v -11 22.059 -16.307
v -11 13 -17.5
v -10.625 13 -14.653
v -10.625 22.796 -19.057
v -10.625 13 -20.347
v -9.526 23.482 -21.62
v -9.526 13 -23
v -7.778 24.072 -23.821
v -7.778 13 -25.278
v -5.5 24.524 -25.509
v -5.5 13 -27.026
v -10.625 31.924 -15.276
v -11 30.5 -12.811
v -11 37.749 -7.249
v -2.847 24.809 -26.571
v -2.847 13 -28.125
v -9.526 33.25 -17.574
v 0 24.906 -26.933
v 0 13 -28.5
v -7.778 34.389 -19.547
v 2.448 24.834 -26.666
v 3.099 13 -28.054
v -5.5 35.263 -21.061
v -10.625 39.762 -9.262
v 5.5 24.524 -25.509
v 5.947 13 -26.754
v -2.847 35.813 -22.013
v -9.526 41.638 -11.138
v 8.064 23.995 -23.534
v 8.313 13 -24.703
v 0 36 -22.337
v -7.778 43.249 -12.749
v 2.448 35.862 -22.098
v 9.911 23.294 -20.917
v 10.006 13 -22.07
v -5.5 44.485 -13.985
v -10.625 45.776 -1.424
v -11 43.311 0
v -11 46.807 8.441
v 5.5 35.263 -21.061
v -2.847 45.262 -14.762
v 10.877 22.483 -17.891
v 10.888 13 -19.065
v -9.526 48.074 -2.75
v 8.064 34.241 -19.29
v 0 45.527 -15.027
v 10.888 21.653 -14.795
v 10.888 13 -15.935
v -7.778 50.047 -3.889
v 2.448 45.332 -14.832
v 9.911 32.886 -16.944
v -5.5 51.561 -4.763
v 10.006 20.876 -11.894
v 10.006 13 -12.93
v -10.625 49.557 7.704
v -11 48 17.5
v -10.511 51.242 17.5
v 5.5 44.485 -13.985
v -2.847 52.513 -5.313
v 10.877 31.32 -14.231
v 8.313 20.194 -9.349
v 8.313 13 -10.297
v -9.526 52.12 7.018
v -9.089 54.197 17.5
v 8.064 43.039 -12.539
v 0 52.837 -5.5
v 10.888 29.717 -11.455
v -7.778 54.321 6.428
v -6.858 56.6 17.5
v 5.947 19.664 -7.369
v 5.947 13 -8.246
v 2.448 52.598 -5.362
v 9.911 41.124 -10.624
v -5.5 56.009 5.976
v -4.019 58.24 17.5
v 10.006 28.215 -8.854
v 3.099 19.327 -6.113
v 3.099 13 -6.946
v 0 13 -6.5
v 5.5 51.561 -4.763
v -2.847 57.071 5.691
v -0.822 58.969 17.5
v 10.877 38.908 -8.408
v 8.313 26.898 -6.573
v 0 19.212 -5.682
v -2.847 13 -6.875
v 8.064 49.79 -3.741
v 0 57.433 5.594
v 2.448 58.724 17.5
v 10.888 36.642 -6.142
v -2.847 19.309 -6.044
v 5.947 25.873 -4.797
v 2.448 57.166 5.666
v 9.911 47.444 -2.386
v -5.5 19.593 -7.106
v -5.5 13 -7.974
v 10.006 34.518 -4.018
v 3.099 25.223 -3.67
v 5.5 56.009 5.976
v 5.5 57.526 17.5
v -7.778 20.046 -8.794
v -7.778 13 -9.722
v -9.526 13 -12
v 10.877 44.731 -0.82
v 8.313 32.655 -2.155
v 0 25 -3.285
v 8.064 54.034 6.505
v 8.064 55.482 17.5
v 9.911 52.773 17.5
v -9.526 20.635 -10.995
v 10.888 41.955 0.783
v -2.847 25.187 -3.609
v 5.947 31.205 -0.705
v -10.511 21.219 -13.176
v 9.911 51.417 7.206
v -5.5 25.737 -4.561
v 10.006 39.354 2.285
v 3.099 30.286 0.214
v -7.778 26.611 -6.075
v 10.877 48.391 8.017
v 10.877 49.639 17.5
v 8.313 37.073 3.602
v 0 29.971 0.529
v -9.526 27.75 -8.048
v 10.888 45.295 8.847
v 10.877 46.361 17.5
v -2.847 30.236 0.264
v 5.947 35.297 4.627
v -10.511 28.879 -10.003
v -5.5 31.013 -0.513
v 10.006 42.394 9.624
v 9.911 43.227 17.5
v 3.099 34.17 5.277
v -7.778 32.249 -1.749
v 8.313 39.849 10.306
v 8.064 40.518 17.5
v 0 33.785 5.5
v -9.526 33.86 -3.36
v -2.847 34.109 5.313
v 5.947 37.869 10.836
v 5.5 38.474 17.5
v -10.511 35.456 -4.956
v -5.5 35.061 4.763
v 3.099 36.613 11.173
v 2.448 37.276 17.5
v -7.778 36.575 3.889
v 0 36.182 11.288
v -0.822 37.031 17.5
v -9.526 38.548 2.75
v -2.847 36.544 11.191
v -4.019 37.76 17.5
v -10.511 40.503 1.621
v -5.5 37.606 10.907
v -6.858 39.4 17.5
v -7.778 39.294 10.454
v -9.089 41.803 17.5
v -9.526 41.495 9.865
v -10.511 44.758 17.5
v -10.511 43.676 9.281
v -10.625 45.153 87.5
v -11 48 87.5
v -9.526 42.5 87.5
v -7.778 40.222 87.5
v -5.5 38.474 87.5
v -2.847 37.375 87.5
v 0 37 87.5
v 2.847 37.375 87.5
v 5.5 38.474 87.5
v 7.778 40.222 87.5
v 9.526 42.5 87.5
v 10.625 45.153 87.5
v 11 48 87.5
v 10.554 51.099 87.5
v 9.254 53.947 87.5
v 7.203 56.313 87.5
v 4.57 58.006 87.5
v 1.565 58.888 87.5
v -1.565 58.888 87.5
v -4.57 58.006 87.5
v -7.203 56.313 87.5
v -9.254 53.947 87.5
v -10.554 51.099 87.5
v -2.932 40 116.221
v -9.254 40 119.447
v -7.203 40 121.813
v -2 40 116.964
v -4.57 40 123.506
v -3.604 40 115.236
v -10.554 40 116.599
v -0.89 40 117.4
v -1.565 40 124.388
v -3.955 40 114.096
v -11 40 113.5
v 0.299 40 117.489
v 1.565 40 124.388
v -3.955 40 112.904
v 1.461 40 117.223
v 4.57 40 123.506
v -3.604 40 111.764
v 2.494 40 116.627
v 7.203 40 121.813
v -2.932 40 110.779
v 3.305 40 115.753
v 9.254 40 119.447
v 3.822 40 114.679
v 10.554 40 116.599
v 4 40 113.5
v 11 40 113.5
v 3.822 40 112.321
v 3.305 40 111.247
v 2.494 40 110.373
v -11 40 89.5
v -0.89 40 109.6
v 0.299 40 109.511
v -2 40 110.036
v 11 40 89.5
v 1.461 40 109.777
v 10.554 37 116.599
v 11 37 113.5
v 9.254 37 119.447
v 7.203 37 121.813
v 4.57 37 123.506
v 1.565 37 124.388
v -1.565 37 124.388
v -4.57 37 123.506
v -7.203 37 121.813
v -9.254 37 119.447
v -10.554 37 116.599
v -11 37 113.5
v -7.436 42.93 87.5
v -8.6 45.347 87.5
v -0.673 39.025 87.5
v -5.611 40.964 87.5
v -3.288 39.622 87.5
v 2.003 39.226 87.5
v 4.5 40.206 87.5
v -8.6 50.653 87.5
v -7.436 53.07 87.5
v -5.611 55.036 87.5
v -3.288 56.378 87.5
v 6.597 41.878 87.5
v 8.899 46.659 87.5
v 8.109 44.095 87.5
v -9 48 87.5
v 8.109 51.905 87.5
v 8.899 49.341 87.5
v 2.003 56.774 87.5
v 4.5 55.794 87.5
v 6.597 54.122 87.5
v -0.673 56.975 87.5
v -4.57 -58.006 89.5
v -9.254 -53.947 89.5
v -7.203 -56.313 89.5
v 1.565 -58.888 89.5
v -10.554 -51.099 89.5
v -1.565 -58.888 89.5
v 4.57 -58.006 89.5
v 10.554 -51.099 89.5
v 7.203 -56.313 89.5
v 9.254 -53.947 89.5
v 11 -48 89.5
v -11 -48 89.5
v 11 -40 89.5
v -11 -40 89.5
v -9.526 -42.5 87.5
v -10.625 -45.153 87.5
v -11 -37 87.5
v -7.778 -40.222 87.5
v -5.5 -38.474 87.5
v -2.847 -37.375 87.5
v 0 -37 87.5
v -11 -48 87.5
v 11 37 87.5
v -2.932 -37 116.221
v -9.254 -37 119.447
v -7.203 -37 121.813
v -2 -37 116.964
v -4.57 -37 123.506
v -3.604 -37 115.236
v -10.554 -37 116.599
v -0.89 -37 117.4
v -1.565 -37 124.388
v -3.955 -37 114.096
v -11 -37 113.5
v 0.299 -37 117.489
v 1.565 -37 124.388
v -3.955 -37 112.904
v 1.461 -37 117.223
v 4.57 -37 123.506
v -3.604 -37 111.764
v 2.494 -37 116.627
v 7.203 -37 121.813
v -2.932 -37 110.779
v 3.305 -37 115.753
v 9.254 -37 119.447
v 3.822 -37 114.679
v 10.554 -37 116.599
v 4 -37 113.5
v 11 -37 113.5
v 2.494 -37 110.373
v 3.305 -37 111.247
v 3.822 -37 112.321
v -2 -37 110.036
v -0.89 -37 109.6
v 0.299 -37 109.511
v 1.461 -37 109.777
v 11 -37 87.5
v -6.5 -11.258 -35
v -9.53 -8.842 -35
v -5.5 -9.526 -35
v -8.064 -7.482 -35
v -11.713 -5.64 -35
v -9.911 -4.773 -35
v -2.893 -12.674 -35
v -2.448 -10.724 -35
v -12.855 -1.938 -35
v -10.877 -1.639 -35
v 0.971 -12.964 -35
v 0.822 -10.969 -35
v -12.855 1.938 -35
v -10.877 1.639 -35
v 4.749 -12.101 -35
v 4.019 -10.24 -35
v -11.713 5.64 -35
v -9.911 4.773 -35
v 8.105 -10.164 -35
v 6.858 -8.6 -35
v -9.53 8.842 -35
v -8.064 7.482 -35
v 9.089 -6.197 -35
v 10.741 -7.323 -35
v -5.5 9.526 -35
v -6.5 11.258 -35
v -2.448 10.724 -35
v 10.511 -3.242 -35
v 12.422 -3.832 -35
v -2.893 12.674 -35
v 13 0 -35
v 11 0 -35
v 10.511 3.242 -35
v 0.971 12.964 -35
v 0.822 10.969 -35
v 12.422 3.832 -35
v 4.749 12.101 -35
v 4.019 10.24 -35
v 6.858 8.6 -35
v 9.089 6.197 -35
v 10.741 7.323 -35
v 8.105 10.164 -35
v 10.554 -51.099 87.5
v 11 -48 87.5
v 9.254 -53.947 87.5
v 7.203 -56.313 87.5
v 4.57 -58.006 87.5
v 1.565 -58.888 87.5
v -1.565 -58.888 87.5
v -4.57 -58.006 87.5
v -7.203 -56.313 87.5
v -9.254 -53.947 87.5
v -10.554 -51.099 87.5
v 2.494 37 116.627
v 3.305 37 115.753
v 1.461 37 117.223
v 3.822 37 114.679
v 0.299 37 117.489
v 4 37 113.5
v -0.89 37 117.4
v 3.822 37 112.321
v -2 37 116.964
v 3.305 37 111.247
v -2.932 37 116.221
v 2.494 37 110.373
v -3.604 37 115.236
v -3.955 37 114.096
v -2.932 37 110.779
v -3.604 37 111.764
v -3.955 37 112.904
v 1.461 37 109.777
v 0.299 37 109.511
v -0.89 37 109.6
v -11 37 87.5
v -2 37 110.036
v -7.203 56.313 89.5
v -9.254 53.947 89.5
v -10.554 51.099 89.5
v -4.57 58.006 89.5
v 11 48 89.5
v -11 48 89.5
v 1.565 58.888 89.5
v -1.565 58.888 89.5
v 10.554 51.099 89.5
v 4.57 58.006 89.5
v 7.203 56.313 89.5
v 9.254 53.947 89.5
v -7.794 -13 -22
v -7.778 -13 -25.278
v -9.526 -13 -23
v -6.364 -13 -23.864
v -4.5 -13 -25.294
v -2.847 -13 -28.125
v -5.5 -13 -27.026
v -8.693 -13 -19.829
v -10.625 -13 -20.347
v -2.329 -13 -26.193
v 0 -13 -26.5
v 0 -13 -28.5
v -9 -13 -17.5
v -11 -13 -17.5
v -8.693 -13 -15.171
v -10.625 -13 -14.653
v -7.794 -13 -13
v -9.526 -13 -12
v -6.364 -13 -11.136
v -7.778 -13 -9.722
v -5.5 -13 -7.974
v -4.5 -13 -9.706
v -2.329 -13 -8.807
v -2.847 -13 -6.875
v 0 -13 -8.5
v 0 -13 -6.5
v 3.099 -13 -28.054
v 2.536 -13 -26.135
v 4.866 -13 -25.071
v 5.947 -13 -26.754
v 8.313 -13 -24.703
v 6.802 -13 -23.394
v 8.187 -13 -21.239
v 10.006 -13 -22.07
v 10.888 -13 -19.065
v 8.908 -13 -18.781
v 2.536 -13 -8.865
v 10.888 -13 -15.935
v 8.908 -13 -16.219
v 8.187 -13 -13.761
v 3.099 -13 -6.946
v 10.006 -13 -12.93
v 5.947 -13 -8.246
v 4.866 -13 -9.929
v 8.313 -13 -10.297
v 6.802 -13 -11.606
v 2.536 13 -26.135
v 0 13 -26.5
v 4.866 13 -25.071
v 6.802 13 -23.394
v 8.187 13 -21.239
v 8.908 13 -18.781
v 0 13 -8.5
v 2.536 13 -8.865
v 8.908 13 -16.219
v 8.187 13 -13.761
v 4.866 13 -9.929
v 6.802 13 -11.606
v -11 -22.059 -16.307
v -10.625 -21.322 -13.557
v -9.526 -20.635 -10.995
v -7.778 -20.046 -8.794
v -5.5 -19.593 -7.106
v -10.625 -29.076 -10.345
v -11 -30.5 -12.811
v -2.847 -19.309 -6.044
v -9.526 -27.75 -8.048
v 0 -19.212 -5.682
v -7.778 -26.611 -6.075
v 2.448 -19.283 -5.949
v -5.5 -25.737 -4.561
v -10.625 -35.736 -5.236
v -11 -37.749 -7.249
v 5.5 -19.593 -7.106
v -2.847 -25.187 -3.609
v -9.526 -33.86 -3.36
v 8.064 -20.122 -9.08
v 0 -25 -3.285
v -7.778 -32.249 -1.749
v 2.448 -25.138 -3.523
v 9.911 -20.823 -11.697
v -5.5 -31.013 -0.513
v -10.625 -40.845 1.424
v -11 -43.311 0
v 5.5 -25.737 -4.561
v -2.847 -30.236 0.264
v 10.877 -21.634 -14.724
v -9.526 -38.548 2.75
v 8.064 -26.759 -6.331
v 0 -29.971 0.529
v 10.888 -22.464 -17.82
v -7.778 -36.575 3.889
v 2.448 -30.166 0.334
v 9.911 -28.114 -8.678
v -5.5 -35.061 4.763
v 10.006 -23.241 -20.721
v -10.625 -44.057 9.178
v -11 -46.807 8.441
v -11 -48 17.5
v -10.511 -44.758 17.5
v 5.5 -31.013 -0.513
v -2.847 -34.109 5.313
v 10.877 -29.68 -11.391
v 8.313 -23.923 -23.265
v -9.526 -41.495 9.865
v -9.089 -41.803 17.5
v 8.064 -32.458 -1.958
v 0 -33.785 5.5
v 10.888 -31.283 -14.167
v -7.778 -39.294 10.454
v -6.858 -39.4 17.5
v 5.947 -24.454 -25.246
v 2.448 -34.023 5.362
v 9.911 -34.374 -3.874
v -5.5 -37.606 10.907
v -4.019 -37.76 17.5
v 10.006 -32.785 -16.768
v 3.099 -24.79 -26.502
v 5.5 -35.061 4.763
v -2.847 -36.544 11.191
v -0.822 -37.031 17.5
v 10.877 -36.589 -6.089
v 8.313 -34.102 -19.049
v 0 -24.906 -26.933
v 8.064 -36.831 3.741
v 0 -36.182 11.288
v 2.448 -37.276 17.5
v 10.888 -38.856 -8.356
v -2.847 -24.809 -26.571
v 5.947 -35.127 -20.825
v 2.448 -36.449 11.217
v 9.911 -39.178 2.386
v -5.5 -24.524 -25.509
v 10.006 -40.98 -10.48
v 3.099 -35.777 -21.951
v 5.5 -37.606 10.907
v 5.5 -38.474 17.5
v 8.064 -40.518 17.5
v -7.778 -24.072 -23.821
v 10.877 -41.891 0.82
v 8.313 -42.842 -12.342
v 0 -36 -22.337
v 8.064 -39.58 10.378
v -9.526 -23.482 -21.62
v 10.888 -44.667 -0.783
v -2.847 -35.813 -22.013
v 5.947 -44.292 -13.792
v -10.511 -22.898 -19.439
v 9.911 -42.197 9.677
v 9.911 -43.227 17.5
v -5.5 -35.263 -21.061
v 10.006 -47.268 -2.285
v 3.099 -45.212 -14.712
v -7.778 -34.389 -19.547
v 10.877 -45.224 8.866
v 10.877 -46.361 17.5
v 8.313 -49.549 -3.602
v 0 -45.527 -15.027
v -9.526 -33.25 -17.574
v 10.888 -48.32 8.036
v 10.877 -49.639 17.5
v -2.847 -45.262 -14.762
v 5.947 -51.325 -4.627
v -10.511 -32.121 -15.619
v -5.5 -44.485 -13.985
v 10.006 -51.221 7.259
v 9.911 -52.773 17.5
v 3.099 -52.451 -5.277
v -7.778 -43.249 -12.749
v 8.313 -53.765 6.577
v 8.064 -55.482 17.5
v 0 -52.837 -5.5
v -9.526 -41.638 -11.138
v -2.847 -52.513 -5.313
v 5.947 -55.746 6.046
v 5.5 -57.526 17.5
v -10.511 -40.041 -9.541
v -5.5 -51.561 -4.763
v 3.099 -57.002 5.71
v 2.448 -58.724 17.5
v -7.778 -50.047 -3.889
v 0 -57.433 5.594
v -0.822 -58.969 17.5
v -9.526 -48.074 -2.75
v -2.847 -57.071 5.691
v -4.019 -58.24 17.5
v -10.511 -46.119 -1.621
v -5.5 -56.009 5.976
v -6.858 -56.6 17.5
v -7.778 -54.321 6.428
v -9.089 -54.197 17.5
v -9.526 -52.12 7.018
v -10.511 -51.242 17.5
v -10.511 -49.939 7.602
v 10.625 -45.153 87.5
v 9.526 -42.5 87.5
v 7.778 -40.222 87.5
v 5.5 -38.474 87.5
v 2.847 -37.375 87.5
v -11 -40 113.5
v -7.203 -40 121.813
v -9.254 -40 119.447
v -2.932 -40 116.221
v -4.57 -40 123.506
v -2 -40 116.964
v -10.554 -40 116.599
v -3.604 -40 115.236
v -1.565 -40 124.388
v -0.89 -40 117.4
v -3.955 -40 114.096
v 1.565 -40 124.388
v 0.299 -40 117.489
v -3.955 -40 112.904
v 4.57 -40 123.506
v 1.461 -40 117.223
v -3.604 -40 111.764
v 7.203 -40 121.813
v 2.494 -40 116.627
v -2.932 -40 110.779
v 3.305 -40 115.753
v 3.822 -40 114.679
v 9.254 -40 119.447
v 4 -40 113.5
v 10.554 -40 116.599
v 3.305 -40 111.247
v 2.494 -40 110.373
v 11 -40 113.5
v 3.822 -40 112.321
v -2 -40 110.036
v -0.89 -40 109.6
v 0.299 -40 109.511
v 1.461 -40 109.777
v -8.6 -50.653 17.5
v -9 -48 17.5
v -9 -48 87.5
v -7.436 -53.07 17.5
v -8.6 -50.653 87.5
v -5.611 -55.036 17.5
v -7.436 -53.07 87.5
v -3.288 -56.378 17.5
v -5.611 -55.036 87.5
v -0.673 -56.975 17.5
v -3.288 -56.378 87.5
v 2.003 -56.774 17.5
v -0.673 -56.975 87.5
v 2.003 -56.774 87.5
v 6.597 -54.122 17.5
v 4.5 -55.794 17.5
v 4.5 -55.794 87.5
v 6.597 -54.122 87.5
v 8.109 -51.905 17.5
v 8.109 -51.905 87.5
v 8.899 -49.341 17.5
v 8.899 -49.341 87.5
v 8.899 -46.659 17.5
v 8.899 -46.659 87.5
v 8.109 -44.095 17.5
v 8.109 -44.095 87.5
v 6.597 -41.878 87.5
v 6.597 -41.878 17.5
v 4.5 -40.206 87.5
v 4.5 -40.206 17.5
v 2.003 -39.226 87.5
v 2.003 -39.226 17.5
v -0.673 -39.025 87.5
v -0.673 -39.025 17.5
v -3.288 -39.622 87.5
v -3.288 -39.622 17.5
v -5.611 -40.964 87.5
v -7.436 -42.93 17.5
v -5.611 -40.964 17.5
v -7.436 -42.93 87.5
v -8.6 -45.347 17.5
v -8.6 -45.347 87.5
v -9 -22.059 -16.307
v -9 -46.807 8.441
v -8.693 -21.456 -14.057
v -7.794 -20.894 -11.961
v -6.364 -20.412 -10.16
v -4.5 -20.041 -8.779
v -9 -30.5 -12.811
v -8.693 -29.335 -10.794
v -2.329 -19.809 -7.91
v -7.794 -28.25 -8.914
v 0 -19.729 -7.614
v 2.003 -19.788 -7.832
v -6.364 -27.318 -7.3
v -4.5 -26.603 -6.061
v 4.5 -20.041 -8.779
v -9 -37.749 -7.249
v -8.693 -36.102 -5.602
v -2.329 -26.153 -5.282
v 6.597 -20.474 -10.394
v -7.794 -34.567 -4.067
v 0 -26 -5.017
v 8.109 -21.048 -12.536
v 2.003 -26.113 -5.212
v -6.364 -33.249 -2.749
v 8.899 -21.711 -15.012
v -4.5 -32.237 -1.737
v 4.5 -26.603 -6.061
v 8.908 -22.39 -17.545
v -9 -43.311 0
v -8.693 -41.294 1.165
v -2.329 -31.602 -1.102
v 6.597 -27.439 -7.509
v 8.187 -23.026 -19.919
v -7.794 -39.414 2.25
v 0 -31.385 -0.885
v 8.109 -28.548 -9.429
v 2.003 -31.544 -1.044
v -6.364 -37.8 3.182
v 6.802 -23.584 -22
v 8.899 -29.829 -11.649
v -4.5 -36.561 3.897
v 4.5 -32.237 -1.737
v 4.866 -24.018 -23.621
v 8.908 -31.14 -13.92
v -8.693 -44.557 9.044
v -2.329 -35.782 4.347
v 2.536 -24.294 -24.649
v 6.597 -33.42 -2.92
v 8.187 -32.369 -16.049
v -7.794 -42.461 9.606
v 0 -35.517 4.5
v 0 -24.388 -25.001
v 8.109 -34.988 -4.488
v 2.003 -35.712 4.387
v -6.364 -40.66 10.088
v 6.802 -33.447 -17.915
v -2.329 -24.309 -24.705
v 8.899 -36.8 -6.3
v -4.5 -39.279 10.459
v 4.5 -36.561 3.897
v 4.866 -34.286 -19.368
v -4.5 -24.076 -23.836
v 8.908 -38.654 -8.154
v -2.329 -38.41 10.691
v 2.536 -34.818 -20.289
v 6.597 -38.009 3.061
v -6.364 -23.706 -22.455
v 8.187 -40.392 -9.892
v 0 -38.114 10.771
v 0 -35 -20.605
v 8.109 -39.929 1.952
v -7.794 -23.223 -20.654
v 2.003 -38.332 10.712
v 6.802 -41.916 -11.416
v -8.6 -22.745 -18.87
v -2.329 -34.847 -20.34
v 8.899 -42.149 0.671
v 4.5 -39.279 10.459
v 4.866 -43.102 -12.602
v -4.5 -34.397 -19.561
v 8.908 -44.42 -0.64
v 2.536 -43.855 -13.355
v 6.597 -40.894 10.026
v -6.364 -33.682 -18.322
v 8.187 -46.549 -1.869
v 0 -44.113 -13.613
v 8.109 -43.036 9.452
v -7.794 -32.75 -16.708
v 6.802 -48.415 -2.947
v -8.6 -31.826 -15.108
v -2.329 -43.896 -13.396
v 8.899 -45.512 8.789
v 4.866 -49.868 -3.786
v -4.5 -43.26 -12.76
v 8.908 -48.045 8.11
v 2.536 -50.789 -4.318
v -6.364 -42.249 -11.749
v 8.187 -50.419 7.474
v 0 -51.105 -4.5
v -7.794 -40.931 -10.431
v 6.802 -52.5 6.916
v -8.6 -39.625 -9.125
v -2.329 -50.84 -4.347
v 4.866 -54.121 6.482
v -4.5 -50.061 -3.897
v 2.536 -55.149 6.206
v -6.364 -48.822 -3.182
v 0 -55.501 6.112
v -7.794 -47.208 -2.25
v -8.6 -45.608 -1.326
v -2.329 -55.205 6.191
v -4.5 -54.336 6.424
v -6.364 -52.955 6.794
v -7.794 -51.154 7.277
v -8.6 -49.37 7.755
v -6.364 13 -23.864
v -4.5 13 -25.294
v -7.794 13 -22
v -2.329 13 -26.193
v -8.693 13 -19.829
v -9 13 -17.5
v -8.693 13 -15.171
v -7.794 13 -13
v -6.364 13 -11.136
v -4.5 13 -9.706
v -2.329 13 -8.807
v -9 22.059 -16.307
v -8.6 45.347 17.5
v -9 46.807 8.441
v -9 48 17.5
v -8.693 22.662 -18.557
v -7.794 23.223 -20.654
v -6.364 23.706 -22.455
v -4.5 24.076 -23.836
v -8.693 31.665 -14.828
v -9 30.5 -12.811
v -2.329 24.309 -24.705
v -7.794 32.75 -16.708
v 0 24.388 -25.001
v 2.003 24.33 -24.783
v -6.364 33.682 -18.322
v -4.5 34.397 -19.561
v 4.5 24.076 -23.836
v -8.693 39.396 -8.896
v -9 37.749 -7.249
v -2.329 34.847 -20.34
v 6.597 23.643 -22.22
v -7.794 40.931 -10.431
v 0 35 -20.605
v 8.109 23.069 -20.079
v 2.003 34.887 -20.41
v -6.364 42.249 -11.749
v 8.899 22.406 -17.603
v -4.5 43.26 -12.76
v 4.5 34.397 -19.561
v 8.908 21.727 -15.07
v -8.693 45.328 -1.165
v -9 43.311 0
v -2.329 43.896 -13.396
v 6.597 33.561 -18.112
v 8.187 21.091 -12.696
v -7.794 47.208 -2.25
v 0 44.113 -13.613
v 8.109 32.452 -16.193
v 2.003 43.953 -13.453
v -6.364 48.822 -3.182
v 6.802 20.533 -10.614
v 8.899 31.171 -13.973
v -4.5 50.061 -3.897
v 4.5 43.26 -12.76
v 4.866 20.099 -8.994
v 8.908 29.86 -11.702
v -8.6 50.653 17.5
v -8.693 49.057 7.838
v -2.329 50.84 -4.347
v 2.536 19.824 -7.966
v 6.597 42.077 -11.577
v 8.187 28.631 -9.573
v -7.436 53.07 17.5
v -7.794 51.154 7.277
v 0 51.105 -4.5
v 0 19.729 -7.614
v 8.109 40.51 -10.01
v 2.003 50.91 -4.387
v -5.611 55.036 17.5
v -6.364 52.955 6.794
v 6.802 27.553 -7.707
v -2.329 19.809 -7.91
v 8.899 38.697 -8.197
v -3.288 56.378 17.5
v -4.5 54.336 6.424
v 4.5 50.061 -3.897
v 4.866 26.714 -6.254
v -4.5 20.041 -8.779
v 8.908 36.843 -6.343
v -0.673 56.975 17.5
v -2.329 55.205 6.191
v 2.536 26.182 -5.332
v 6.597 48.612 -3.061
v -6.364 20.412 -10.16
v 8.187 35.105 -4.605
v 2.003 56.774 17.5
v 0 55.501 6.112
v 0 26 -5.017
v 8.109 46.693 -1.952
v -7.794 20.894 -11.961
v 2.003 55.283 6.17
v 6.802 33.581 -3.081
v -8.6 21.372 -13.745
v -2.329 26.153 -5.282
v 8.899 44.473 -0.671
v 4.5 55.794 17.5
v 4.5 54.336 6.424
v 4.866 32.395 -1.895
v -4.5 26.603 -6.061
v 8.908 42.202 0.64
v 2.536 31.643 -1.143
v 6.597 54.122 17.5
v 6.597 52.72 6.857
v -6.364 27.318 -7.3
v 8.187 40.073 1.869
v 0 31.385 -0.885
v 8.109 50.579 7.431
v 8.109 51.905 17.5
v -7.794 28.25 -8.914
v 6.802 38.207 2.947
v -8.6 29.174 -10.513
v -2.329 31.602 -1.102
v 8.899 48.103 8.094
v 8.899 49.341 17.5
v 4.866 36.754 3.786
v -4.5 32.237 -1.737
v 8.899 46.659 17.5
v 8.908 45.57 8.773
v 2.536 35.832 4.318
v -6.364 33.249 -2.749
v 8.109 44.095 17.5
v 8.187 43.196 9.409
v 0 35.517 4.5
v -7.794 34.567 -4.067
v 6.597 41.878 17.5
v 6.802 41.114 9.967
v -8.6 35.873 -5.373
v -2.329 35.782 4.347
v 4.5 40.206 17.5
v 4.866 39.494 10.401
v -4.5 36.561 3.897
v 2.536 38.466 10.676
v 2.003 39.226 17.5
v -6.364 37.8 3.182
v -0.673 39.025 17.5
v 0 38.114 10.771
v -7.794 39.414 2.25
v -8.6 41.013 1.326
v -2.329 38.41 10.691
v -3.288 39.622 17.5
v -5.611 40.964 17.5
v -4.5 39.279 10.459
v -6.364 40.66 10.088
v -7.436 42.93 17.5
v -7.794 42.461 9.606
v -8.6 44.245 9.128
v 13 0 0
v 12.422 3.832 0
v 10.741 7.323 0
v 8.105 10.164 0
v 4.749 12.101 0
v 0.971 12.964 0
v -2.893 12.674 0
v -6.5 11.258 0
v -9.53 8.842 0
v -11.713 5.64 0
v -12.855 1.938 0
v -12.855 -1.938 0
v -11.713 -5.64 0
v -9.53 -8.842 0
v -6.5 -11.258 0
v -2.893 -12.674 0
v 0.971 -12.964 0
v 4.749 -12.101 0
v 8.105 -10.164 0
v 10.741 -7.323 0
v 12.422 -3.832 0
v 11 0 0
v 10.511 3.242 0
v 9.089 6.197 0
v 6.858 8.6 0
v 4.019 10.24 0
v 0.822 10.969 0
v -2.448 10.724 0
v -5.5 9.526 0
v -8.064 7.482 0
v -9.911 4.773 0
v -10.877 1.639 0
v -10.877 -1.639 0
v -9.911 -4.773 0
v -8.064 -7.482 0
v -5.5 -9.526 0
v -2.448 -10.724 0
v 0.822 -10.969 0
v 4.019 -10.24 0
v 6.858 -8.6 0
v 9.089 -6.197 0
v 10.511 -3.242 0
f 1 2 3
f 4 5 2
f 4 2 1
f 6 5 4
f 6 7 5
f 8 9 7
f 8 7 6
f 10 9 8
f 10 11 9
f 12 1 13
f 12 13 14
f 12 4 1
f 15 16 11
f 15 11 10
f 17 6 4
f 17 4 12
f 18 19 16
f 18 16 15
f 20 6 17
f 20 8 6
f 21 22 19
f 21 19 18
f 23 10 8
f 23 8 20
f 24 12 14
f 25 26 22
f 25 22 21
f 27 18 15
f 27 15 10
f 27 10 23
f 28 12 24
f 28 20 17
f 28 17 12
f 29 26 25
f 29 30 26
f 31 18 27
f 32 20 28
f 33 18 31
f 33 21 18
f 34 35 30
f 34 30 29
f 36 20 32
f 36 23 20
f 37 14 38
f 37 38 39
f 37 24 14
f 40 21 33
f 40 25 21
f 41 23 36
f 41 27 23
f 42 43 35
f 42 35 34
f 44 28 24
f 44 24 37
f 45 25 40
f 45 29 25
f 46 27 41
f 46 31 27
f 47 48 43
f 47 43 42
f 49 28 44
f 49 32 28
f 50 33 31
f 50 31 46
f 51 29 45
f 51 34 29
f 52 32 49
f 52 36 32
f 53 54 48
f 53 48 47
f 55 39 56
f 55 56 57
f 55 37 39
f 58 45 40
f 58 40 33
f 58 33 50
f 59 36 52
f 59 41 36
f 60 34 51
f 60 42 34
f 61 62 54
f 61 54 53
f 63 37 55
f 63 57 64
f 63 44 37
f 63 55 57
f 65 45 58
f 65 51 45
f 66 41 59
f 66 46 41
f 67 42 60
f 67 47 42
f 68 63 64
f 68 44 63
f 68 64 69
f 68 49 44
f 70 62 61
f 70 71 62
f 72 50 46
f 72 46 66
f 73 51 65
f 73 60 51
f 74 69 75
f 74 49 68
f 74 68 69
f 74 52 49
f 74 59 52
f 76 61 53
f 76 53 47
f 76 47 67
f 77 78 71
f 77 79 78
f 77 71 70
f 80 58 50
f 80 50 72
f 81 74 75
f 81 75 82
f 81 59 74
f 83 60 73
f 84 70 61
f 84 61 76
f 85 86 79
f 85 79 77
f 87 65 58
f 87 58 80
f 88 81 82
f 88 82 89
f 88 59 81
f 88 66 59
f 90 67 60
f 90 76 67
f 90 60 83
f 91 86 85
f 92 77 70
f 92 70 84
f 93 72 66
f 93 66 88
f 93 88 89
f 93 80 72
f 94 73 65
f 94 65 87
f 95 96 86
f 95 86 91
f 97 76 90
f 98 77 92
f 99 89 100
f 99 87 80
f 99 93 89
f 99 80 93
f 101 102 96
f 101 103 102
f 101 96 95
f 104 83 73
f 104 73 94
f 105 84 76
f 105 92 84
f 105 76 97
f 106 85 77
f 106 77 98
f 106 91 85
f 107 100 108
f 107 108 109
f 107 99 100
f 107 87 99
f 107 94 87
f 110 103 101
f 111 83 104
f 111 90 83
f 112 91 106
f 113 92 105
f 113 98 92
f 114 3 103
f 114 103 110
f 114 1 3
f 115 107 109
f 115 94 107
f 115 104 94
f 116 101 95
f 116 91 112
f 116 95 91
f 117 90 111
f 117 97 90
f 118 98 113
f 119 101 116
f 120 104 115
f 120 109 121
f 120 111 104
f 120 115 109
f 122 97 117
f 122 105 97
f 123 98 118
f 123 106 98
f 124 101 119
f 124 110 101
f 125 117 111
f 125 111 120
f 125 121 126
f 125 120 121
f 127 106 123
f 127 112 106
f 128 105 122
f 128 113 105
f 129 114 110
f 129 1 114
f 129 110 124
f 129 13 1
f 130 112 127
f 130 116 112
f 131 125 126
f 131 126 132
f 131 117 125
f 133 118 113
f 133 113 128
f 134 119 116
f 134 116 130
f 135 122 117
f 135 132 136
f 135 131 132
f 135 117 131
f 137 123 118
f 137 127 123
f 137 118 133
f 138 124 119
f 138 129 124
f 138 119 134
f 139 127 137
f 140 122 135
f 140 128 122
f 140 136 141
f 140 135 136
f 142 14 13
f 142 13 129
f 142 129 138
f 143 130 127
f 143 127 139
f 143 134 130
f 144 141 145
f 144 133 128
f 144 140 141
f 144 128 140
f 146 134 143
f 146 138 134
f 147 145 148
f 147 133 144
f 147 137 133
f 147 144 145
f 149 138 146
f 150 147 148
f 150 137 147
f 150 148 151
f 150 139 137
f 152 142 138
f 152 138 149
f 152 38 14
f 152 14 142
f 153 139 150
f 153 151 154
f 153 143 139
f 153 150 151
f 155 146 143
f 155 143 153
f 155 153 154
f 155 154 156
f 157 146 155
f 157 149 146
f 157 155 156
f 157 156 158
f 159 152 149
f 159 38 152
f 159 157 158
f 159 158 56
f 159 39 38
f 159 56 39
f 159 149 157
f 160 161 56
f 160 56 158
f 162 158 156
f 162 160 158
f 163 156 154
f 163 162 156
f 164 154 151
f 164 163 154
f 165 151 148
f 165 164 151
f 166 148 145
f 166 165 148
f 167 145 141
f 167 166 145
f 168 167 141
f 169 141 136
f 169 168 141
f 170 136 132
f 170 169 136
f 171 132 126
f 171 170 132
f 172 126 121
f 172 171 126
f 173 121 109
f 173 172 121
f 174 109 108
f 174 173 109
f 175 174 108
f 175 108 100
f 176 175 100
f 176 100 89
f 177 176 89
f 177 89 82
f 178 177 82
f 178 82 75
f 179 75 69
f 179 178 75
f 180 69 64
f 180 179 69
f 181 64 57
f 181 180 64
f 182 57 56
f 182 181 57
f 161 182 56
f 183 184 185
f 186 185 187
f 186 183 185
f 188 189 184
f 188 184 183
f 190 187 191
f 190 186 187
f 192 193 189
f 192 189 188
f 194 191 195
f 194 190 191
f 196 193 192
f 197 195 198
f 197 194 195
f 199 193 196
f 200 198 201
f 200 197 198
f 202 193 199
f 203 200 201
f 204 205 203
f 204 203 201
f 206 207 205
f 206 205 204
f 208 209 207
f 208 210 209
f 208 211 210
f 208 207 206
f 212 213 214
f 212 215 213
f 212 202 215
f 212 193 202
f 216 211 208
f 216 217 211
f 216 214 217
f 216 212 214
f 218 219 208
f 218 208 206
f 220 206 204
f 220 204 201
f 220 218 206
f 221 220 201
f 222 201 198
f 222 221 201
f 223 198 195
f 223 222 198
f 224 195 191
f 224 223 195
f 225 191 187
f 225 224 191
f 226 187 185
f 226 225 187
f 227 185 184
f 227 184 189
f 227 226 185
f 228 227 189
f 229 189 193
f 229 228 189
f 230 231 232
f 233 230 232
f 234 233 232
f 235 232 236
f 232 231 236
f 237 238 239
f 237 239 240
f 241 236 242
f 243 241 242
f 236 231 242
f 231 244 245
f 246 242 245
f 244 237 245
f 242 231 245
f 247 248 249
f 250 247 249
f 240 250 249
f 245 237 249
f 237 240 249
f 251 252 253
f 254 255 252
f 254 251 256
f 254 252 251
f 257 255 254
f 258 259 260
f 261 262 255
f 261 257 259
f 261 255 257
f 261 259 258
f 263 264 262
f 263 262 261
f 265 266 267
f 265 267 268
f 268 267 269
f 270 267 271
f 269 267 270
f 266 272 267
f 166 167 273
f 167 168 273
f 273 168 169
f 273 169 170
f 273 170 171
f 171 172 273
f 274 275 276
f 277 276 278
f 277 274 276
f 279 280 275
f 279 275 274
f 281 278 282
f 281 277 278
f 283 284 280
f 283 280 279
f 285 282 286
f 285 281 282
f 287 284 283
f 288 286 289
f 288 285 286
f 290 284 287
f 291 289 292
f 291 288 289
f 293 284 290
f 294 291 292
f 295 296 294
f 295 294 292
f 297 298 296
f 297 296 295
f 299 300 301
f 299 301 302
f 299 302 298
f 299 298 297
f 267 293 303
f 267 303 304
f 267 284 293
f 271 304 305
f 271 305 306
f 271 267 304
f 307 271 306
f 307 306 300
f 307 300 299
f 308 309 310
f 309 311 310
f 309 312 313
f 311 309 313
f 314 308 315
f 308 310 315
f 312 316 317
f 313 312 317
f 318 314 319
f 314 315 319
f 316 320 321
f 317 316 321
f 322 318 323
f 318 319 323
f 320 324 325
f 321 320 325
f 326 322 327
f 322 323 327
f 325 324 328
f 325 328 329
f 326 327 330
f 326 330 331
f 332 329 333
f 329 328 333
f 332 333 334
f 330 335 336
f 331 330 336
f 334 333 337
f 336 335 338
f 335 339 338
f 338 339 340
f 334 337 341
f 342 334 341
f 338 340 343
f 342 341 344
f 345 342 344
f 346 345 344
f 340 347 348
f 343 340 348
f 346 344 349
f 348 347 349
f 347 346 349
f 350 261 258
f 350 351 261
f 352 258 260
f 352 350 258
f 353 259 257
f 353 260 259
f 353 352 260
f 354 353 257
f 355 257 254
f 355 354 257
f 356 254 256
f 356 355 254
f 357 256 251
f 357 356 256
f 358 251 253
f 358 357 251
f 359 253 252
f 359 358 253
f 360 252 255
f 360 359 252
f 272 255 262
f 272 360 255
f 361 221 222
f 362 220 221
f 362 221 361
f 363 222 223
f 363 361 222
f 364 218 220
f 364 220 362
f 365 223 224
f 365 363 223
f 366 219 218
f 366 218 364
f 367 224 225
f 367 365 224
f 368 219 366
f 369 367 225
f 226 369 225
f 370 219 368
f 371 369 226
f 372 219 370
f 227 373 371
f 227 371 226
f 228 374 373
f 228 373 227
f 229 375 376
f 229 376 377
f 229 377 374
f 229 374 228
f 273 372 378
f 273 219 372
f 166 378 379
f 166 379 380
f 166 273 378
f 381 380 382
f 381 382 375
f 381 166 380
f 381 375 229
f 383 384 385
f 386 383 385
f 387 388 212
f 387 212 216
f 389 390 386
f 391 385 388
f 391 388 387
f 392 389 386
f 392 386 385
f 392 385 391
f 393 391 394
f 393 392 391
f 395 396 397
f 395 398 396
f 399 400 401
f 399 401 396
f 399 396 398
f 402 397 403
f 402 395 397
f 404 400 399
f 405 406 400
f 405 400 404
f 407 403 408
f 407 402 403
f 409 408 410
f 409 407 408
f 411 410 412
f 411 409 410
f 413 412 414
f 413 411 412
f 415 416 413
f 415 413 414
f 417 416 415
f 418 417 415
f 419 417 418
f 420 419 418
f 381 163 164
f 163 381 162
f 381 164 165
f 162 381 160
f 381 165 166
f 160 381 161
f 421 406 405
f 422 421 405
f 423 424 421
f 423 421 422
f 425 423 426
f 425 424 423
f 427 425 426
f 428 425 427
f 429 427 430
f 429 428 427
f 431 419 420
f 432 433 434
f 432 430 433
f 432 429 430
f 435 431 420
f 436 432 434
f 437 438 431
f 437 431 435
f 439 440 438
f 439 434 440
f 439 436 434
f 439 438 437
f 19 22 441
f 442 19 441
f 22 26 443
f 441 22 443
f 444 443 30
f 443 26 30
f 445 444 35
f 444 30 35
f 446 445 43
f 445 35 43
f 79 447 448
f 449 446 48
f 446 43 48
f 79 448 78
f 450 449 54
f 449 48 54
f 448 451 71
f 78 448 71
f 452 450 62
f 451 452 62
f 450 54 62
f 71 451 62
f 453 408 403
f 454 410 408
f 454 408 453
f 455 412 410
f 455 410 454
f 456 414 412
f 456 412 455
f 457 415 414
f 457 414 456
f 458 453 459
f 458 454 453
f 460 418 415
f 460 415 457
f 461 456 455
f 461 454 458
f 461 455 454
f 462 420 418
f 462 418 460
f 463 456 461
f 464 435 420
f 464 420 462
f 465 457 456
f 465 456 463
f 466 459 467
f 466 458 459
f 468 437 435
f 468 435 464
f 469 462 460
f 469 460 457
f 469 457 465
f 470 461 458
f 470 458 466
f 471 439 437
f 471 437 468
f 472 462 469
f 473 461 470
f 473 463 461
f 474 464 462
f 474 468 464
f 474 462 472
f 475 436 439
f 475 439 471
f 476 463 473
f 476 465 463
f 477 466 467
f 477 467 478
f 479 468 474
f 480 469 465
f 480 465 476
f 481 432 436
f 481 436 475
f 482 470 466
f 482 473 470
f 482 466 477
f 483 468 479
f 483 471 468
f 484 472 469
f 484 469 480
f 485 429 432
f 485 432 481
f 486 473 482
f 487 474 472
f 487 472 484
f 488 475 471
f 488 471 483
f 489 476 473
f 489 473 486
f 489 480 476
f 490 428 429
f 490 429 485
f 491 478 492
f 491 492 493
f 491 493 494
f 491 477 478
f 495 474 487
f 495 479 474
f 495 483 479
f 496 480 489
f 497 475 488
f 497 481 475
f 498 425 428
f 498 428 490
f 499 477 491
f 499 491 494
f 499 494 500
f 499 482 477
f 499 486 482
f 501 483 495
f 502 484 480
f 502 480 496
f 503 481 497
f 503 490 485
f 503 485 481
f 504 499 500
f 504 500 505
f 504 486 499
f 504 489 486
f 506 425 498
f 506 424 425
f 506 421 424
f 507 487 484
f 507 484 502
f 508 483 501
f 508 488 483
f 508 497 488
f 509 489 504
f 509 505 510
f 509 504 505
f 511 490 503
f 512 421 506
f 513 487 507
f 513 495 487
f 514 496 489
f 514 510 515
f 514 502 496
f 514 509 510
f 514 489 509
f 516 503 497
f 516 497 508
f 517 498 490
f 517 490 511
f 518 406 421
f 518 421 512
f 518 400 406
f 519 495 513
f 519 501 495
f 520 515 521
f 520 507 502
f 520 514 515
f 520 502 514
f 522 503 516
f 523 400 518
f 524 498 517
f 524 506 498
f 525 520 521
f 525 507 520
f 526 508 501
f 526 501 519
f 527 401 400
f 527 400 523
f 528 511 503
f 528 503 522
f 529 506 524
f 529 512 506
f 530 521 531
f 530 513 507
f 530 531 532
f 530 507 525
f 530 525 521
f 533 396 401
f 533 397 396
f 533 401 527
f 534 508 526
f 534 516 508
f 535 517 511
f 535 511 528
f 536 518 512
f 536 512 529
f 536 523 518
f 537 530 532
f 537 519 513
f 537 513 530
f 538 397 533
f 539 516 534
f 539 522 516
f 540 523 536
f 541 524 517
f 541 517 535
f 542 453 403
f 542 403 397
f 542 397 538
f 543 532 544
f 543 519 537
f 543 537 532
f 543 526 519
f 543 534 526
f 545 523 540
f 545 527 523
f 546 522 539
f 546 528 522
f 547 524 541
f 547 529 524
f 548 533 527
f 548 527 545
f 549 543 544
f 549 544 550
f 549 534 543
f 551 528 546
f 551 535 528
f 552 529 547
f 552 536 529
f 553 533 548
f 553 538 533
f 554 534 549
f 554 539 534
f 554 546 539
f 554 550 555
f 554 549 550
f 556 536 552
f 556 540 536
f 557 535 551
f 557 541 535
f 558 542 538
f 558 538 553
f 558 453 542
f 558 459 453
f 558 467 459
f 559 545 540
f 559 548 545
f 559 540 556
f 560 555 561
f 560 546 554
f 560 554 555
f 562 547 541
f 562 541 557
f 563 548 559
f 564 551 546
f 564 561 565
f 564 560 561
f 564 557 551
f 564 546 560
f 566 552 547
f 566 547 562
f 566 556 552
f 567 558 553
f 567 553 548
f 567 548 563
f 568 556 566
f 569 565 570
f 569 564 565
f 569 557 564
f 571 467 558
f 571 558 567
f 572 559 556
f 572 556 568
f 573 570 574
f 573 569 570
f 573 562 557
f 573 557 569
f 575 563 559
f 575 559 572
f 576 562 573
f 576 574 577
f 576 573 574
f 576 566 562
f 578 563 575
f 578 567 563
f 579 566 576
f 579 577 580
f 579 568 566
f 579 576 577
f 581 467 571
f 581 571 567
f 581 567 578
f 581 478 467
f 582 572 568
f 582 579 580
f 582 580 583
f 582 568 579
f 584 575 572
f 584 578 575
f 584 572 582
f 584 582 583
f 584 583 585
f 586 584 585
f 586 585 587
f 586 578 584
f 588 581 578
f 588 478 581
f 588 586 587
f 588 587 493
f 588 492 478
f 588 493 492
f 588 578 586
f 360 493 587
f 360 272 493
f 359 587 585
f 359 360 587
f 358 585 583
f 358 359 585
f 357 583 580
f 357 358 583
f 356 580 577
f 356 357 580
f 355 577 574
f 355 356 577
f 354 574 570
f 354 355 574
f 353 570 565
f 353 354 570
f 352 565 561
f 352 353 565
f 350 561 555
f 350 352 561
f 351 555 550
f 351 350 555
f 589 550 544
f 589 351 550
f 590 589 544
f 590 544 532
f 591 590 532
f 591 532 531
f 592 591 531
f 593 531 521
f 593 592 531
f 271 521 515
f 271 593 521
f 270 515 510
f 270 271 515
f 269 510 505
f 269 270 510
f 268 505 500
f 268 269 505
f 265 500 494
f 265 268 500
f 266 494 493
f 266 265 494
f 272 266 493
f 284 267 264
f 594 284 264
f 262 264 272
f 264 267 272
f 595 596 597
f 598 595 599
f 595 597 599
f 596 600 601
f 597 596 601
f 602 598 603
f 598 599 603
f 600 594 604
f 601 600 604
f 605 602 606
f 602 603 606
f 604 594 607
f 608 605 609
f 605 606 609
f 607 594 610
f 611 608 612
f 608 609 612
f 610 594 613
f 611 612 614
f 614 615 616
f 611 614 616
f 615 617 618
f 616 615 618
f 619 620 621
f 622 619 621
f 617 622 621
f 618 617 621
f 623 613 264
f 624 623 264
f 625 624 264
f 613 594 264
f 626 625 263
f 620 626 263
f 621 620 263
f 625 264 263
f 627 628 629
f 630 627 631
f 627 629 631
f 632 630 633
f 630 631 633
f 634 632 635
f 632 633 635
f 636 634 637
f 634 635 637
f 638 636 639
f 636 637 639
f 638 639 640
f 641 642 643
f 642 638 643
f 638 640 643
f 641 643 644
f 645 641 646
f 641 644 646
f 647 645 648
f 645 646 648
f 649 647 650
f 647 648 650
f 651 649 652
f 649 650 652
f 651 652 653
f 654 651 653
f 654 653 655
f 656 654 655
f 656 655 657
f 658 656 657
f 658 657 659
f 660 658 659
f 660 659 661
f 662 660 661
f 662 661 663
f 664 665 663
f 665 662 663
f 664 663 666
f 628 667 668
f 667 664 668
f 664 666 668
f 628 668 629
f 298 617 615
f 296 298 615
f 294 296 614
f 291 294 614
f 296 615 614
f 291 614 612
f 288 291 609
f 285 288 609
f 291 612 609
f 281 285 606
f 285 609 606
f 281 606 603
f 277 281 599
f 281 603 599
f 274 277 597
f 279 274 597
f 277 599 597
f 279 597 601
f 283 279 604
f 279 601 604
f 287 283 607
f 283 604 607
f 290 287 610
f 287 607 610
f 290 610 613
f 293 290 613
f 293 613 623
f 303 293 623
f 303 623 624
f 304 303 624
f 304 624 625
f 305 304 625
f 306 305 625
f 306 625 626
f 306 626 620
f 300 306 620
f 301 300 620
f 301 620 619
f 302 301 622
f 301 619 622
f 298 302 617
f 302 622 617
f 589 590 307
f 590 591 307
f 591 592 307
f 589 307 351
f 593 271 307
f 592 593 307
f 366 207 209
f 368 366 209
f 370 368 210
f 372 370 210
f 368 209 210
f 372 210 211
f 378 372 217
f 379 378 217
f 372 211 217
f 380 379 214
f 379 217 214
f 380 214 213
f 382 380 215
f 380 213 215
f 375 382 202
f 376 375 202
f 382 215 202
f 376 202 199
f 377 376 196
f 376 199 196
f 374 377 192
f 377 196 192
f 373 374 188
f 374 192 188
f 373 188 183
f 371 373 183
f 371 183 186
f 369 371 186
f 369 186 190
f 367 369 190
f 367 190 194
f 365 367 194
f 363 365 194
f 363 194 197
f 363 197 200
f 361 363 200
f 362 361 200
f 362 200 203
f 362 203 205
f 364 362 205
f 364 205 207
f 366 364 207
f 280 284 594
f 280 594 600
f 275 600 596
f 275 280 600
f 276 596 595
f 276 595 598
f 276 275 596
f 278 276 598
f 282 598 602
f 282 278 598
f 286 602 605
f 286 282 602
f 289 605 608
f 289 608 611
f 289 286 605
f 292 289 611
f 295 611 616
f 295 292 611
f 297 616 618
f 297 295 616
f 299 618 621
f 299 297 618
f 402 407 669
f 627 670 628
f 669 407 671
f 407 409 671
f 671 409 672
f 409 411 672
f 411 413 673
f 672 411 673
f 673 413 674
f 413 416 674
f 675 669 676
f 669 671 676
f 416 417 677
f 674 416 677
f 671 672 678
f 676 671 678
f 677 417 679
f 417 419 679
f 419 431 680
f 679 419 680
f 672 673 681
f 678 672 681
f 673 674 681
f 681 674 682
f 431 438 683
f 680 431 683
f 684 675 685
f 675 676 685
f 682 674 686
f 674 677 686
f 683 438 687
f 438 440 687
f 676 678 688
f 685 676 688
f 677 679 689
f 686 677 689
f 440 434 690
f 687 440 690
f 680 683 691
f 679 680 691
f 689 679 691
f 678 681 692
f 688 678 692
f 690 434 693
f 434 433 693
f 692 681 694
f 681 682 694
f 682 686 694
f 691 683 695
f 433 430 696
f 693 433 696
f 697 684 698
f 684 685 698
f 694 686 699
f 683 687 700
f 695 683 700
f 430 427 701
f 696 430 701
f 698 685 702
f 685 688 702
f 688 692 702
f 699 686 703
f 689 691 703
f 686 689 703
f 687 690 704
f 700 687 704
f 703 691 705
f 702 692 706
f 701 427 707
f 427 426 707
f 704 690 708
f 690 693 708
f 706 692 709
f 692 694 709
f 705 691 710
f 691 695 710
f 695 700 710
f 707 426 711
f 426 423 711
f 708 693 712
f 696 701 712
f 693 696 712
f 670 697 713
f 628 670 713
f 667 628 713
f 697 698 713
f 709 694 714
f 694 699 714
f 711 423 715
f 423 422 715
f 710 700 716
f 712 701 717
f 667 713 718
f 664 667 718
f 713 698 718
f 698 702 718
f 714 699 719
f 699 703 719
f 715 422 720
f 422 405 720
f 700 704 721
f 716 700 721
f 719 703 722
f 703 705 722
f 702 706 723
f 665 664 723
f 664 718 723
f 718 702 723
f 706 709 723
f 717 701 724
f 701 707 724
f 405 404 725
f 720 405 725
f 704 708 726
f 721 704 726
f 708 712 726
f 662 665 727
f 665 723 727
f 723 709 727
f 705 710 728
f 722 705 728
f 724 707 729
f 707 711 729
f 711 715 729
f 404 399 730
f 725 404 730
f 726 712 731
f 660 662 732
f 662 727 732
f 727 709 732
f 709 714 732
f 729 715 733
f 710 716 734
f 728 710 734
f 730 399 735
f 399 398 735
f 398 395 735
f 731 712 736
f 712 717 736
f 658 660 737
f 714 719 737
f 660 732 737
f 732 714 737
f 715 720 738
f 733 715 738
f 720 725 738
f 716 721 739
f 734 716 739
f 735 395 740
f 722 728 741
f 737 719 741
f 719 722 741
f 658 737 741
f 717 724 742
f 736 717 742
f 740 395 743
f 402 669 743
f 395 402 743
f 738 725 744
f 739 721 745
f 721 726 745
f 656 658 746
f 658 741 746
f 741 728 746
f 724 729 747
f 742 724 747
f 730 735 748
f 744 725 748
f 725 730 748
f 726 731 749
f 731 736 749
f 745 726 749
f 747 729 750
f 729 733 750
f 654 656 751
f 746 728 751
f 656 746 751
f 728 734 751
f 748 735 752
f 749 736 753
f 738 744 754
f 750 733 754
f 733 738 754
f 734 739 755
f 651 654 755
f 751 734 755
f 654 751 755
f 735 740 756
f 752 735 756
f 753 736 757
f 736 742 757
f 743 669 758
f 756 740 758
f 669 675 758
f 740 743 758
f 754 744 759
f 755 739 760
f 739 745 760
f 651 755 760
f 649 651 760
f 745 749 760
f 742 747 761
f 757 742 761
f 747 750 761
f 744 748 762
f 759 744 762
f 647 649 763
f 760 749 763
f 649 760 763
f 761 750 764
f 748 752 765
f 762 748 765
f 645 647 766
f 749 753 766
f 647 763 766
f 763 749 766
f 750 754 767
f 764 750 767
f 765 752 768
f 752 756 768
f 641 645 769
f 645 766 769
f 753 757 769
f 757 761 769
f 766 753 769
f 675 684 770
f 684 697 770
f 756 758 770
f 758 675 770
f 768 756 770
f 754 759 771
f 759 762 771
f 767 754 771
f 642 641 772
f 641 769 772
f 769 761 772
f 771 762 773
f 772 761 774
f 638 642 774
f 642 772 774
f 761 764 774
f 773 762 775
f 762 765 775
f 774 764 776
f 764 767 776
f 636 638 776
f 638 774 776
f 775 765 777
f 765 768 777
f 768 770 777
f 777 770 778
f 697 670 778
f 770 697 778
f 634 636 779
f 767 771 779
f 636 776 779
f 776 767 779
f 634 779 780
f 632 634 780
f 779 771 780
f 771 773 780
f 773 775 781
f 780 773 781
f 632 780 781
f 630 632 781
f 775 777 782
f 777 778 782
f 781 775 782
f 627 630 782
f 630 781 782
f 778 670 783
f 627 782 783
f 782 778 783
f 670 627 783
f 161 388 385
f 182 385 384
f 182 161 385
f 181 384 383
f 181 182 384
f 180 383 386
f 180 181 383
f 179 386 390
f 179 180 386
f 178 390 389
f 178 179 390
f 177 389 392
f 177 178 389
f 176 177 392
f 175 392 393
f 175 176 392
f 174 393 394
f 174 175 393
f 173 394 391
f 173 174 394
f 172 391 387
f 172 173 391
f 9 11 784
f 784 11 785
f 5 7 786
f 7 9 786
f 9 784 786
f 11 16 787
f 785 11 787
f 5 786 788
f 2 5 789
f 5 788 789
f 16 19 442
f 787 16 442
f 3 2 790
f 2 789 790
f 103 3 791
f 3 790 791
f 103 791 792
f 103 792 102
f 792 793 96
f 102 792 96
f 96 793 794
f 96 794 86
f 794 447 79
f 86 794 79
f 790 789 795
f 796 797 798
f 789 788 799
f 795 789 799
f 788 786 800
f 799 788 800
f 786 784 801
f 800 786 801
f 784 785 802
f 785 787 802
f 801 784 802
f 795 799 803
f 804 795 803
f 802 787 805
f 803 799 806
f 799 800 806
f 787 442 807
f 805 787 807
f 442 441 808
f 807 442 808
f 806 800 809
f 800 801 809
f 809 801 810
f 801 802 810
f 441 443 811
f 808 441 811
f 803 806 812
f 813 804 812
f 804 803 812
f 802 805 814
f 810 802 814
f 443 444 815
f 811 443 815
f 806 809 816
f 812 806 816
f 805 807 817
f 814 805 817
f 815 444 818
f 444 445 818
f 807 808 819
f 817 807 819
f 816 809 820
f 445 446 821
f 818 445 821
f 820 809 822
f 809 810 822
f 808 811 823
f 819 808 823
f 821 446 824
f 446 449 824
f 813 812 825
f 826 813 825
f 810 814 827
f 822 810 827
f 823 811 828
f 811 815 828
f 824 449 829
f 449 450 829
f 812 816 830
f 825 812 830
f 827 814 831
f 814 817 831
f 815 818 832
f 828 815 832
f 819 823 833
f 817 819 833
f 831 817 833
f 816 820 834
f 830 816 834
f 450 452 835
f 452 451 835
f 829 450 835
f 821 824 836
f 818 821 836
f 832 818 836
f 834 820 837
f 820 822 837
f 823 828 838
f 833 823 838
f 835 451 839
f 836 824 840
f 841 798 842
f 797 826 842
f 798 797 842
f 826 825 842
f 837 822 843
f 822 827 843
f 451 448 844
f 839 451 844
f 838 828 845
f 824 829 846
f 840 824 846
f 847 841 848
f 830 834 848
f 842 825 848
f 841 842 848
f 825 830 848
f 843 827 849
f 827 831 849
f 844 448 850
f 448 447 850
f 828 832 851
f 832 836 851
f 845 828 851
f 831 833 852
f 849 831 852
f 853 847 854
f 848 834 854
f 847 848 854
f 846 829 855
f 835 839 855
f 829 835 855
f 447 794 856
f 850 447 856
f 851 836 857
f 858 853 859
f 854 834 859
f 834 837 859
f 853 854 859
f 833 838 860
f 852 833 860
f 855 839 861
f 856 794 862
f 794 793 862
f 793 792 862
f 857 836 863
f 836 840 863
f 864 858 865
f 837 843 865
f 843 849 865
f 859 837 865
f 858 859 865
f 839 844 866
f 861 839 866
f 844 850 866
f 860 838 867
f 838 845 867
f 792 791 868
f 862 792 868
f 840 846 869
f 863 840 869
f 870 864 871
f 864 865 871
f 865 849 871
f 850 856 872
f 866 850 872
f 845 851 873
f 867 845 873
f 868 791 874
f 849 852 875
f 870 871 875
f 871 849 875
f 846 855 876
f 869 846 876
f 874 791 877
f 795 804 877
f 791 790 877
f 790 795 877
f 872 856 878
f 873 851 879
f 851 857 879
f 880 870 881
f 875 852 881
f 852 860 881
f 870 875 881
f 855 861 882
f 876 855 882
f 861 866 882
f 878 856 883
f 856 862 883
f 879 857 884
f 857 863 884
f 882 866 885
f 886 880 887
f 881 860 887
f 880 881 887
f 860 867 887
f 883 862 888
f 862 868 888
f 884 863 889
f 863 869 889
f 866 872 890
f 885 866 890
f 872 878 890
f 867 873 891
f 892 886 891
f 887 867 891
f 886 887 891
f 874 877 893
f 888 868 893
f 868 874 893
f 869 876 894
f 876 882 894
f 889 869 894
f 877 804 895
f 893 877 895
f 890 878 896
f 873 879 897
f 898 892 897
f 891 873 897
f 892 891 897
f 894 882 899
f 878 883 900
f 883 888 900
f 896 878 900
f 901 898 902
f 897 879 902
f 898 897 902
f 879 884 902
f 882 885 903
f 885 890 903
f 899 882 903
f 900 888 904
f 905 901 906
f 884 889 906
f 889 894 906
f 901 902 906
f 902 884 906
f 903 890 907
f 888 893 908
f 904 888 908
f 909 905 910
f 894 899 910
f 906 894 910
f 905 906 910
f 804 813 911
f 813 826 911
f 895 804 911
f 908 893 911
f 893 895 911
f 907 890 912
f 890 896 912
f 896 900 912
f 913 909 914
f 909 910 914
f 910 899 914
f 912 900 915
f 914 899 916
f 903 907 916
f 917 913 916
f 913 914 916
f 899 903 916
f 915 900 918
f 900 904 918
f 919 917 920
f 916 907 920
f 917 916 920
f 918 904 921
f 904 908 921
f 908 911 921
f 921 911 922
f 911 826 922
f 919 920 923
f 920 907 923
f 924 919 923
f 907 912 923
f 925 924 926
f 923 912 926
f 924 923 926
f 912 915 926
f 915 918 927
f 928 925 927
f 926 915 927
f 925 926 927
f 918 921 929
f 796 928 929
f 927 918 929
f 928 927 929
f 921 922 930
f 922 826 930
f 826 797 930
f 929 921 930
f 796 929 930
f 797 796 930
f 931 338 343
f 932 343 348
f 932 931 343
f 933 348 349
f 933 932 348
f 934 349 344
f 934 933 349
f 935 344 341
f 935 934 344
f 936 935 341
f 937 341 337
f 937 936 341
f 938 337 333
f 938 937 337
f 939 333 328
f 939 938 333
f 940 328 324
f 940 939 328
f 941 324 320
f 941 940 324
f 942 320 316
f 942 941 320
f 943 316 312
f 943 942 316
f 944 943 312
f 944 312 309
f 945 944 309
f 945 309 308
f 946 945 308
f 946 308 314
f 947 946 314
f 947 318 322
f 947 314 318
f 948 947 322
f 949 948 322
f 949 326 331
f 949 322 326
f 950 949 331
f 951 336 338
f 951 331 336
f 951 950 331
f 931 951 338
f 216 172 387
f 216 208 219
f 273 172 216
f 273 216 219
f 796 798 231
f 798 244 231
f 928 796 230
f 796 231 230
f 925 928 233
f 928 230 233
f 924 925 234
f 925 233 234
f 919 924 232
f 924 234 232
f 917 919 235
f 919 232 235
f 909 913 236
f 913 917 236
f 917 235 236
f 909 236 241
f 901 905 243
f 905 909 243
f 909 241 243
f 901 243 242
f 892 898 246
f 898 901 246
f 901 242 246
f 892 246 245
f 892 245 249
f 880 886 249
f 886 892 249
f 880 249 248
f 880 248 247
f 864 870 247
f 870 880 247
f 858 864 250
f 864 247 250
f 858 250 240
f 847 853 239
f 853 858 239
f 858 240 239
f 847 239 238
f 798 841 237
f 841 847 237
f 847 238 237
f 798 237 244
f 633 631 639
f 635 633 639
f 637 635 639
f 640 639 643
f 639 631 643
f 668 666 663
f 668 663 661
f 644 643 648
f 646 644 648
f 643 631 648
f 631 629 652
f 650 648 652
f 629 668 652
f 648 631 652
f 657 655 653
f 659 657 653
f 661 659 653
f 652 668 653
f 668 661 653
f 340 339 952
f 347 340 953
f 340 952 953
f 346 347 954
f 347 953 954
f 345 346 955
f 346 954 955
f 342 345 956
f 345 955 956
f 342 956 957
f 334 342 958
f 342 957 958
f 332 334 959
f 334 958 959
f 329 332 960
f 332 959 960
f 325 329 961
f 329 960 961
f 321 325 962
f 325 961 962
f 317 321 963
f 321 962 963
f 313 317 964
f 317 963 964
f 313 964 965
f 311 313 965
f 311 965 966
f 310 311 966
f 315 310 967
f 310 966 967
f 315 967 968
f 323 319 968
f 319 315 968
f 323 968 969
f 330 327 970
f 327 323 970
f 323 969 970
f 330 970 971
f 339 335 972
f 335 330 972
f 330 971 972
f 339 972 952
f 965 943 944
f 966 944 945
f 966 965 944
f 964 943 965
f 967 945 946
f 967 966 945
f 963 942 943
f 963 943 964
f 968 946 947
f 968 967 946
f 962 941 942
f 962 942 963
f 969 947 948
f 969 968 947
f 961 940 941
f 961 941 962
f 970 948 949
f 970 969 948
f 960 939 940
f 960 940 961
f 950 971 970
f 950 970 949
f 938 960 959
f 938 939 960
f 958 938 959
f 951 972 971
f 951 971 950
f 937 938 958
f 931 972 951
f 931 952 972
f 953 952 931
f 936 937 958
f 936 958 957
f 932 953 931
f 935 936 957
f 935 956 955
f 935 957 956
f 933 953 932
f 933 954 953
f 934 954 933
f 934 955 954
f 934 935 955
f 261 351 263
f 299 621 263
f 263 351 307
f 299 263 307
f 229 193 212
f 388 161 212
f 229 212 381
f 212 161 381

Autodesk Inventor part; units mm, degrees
ref_plane "YZ Plane" through (0, 0, 0) normal (1, 0, 0) x (0, 1, 0)
sketch "Sketch3" plane through (0, 0, 0) normal (0, 0, 1) x (1, 0, 0)
  line L0 (-18.2, 0) -> (18.2, 0) projected
  line L1 (0, -18.2) -> (0, 18.2) projected
  circle A0 centre (0, 0) radius 13
  circle A1 centre (0, 0) radius 11
  dimension "d0" = 26
  dimension "d1" = 22
extrude "Extrusion1" add sketch "Sketch3" against normal blind 35 contours A1 L1 A0 L0 | L0 A0 L1 A1 | A1 L0 A0 L1 | L1 A0 L0 A1
ref_plane "Work Plane1" through (0, 13, 0) normal (0, 1, 0) x (-1, 0, 0)
sketch "Sketch4" plane through (0, 13, 0) normal (0, 1, 0) x (-1, 0, 0)
  line L0 (25.4907, 0) -> (-28.3112, 0) construction
  line L1 (21.6581, -35) -> (-31.1069, -35) construction
  line L2 (0, -47.4243) -> (0, 5.663) construction
  circle A0 centre (0, -17.5) radius 11
  circle A1 centre (0, -17.5) radius 9
  point P0 (0, 0)
  dimension "d4" = 35
  dimension "d5" = 17.5
  dimension "d9" = 22
  dimension "d10" = 18
sketch3d "3D Sketch1"
  arc A0 (0, 13, -17.5) -> (0, 48, 17.5) centre (0, 13, 17.5) ccw
  line L0 (0, 48, 17.5) -> (0, 48, 87.5)
  dimension "d6" = 35
  dimension "d7" = 105
  dimension "d8" = 35
sweep "Sweep1" add profiles "Sketch4" path "3D Sketch1"
sketch "Sketch5" plane through (0, 48, 87.5) normal (0, 0, 1) x (1, 0, 0)
  line L0 (11, 0) -> (11, -11)
  line L1 (11, -11) -> (-11, -11)
  line L2 (-11, -11) -> (-11, 0)
  line L3 (-11, 11) -> (11, -11) construction
  line L4 (11, 11) -> (-11, -11) construction
  arc A0 (11, 0) -> (-11, 0) centre (0, 0) ccw
  point P0 (0, -48)
  dimension "d13" = 22
  dimension "d14" = 22
extrude "Extrusion2" add sketch "Sketch5" along normal blind 2
sketch "Sketch6" plane through (0, 48, 89.5) normal (0, 0, 1) x (1, 0, 0)
  line L0 (0, -11) -> (11, -11) projected
  line L1 (-11, 0) -> (-11, -11) projected
  line L2 (11, -11) -> (-11, -11)
  line L3 (-11, -11) -> (-11, -8)
  line L4 (-11, -8) -> (11, -8)
  line L5 (11, -8) -> (11, -11)
  point P0 (0, -48)
  dimension "d17" = 3
extrude "Extrusion3" add sketch "Sketch6" along normal blind 35
sketch "Sketch7" plane through (-11, 37, 87.5) normal (0, -1, 0) x (1, 0, 0)
  line L0 (22, 0) -> (22, 37) projected
  line L1 (0, 0) -> (0, 37) projected
  arc A0 (22, 26) -> (0, 26) centre (11, 26) ccw
  line L2 (0, 37) -> (22, 37) projected
  point P0 (11, -87.5)
  point P1 (11, 37)
  dimension "d20" = 11
extrude "Extrusion4" cut sketch "Sketch7" against normal up to surface (3 mm away)
sketch "Sketch8" plane through (-11, 40, 89.5) normal (0, 1, 0) x (1, 0, 0)
  circle A0 centre (11, -24) radius 4
  arc A1 (0, -24) -> (22, -24) centre (11, -24) ccw projected
  point P0 (11, 89.5)
  dimension "d23" = 8
  dimension "d24" = 0
extrude "Extrusion5" cut sketch "Sketch8" against normal up to next
ref_plane "Work Plane2" through (0, -13, 0) normal (0, 1, 0) x (-1, 0, 0)
sketch "Sketch11" plane through (0, -13, 0) normal (0, 1, 0) x (-1, 0, 0)
  line L0 (25.4907, 0) -> (-28.3112, 0) construction
  line L1 (21.6581, -35) -> (-31.1069, -35) construction
  line L2 (0, -47.4243) -> (0, 5.663) construction
  circle A0 centre (0, -17.5) radius 11
  circle A1 centre (0, -17.5) radius 9
  point P0 (0, 0)
  dimension "d27" = 35
  dimension "d28" = 17.5
  dimension "d29" = 22
  dimension "d30" = 18
sketch3d "3D Sketch2"
  arc A0 (0, -13, -17.5) -> (0, -48, 17.5) centre (0, -13, 17.5) ccw
  line L0 (0, -48, 17.5) -> (0, -48, 87.5)
  dimension "d31" = 35
  dimension "d32" = 105
  dimension "d33" = 35
sweep "Sweep2" add profiles "Sketch11" path "3D Sketch2"
sketch "Sketch12" plane through (0, -48, 87.5) normal (0, 0, 1) x (1, 0, 0)
  line L0 (-11, 11) -> (11, 11)
  line L1 (11, 11) -> (11, 0)
  line L2 (-11, 0) -> (-11, 11)
  line L3 (-11, 11) -> (11, -11) construction
  line L4 (11, 11) -> (-11, -11) construction
  arc A0 (-11, 0) -> (11, 0) centre (0, 0) ccw
  point P0 (0, 48)
  dimension "d40" = 22
  dimension "d41" = 22
extrude "Extrusion6" add sketch "Sketch12" along normal blind 2
sketch "Sketch13" plane through (0, -48, 89.5) normal (0, 0, 1) x (1, 0, 0)
  line L0 (0, 11) -> (11, 11) projected
  line L1 (11, 11) -> (-11, 11)
  line L2 (-11, 11) -> (-11, 8)
  line L3 (-11, 8) -> (11, 8)
  line L4 (11, 8) -> (11, 11)
  point P0 (0, 48)
  dimension "d44" = 22
  dimension "d45" = 3
extrude "Extrusion7" add sketch "Sketch13" along normal blind 35
extrude "Extrusion8" cut sketch "Sketch7" along normal up to surface (77 mm away)
sketch "Sketch16" plane through (-11, -40, 89.5) normal (0, -1, 0) x (1, 0, 0)
  circle A0 centre (11, 24) radius 4 projected
  circle A1 centre (11, 24) radius 4
  point P0 (11, -89.5)
  dimension "d53" = 8
extrude "Extrusion9" cut sketch "Sketch16" against normal up to next
equation "\"d5\" = 0.5 * d4"
equation "\"d13\" = d14"
equation "\"d28\" = 0.5 * d27"
equation "\"d41\" = d40"
equation "\"BendRadius\" = Thickness"
equation "\"BendReliefWidth\" = Thickness"
equation "\"BendReliefDepth\" = 0.5 * Thickness"
equation "\"CornerReliefSize\" = 4 * Thickness"
equation "\"MinimumRemnant\" = 2 * Thickness"
equation "\"TransitionRadius\" = BendRadius"
equation "\"JacobiRadiusSize\" = BendRadius"
equation "\"GapSize\" = Thickness"
equation "\"Thickness\" = 0.5"
properties part number "Wheel holder on handle bars axle"
